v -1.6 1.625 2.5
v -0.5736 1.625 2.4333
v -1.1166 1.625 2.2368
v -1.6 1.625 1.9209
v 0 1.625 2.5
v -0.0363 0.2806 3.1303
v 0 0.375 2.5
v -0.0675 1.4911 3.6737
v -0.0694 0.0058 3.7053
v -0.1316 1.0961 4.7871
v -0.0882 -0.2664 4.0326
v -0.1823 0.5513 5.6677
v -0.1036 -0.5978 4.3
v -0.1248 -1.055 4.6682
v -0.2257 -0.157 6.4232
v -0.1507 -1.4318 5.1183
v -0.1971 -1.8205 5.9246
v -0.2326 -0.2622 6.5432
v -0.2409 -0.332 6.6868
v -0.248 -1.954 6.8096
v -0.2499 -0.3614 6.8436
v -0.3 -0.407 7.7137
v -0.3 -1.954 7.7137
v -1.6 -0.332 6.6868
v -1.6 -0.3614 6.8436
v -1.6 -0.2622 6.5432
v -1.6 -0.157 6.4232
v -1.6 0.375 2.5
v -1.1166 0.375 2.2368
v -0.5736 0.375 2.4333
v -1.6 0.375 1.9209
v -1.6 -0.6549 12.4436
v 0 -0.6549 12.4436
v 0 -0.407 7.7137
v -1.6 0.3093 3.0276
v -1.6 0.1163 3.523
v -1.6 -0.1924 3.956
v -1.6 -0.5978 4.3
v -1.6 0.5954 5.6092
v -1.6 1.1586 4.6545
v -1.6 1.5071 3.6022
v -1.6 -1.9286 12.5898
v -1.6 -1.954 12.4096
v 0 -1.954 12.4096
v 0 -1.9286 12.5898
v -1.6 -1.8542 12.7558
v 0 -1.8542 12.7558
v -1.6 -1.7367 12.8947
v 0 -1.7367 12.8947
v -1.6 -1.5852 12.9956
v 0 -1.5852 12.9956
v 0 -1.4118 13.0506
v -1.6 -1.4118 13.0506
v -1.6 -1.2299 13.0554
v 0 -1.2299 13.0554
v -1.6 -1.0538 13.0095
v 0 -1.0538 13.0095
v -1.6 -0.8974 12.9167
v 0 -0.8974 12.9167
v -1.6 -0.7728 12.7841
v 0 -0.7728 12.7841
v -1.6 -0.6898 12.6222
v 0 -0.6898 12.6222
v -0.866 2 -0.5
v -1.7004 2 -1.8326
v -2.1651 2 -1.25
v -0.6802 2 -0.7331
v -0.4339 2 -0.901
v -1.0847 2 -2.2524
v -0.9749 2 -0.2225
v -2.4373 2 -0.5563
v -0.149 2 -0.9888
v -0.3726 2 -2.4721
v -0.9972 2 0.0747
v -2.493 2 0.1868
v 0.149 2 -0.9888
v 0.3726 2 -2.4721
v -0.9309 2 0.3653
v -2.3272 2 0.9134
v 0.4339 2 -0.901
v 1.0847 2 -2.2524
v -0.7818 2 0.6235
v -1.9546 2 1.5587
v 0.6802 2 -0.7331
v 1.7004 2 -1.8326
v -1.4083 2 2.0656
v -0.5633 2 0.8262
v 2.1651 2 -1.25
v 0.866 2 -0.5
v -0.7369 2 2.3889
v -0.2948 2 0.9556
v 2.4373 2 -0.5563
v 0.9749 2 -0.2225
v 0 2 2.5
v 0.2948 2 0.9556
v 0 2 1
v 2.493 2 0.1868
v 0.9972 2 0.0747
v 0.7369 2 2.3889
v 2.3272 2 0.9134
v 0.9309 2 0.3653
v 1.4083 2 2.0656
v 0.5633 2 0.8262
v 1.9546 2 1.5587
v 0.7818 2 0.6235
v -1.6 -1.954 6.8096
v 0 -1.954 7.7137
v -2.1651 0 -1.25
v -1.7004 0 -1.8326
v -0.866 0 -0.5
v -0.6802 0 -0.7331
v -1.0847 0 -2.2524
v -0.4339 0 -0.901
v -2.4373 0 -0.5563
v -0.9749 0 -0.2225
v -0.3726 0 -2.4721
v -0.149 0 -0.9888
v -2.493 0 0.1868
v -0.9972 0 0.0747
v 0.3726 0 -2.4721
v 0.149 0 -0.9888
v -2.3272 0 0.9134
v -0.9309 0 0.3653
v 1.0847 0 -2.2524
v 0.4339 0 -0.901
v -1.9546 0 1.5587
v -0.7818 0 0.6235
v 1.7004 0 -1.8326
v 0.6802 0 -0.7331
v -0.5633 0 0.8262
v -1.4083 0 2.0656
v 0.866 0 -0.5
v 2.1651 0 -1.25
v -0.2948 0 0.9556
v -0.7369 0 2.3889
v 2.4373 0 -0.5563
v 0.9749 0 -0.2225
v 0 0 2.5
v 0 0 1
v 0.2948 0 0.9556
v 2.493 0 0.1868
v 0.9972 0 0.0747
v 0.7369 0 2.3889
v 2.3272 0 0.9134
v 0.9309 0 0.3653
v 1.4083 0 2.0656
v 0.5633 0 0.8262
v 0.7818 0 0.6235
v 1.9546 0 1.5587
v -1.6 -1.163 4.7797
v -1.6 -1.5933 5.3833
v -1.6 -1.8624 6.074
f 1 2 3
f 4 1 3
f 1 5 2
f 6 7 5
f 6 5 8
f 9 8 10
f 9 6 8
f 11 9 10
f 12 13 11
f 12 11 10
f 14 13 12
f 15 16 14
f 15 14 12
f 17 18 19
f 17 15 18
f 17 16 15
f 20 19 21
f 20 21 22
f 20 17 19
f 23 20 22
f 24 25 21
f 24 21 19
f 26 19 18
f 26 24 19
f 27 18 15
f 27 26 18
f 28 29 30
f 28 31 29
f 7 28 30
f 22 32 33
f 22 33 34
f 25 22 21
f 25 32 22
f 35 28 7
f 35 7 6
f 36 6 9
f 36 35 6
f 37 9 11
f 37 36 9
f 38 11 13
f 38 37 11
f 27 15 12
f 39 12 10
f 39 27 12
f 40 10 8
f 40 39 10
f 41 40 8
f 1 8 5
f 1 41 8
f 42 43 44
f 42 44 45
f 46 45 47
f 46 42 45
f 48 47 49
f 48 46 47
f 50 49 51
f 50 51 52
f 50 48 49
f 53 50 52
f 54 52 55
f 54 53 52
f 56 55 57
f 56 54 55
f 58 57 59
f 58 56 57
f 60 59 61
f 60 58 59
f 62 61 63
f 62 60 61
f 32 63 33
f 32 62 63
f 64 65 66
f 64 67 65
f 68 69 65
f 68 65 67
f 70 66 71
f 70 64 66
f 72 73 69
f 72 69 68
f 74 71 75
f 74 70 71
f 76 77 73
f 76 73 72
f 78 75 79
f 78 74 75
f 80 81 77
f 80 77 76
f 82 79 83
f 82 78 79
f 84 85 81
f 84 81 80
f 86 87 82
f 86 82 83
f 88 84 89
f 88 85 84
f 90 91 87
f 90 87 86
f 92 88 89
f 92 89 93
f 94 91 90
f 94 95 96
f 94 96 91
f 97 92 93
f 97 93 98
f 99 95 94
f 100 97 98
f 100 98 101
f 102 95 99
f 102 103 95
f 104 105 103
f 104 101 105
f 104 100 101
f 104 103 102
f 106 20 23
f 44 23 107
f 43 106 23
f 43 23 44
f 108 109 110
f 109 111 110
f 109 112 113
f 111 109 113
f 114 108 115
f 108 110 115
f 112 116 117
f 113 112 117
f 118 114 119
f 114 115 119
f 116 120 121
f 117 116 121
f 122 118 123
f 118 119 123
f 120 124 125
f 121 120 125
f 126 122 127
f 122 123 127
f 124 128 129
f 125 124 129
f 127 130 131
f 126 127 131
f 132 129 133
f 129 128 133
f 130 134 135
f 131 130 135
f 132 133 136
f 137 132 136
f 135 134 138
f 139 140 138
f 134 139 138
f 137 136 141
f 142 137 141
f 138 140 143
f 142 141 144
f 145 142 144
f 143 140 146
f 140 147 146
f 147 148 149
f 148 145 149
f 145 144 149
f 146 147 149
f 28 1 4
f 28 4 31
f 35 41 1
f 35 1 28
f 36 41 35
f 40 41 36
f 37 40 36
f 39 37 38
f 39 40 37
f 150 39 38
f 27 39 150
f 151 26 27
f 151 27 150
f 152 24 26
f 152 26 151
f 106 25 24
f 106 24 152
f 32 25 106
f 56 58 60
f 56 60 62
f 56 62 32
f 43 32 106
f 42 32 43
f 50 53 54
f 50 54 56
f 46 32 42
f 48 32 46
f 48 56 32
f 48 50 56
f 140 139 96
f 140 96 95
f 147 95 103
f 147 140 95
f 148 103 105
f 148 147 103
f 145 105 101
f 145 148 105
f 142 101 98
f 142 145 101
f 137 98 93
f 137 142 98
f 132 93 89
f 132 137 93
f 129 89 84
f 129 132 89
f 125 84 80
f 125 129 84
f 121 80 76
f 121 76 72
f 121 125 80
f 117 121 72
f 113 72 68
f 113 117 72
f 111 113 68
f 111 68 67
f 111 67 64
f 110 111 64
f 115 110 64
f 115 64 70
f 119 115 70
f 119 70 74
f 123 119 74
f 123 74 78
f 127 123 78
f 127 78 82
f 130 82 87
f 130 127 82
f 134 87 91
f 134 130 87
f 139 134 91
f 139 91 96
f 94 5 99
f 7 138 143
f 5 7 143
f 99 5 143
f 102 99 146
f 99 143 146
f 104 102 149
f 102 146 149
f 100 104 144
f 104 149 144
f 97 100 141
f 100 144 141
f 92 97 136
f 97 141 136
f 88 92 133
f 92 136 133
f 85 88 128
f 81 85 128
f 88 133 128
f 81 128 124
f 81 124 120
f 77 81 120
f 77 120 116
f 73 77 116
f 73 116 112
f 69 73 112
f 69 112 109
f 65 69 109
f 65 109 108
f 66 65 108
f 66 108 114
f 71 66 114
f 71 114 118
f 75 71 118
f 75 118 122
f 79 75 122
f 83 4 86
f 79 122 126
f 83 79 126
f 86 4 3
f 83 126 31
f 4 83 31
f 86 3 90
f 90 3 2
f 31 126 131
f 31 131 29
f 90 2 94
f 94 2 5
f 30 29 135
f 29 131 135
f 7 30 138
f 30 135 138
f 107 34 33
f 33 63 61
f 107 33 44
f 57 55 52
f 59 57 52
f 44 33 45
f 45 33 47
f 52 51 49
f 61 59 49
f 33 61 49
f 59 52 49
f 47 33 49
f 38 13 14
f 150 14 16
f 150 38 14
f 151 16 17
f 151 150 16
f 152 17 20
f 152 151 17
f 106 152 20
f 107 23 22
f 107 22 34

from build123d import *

# Parameters (mm, degrees)
SKETCH1_R           = 2.5
SKETCH1_R_2         = 1
BOSS_EXTRUDE1_DEPTH = 2
BOSS_EXTRUDE2_DEPTH = 0.8
CUT_EXTRUDE1_DEPTH  = 14.872182458


with BuildPart() as part:
    # Sketch1 → Boss-Extrude1 (new body)
    with BuildSketch(Plane(origin=(0, 0, 0), x_dir=(1, 0, 0), z_dir=(0, 1, 0))):
        with Locations(Location((0, 0, 0), (0, 0, 270))):
            Circle(SKETCH1_R)
        with Locations(Location((0, 0, 0), (0, 0, 270))):
            Circle(SKETCH1_R_2, mode=Mode.SUBTRACT)
    extrude(amount=BOSS_EXTRUDE1_DEPTH)

    # Sketch7 → Boss-Extrude2 (add, symmetric)
    with BuildSketch(Plane(origin=(-0.8, 0, 0), x_dir=(0, -1, 0), z_dir=(-1, 0, 0))):
        with BuildLine():
            Line((1.954019719, 6.809600844), (1.954019719, 12.409600844))
            ThreePointArc((1.954019719, 12.409600844), (1.321034736, 13.059378105), (0.654910522, 12.443619215))
            Line((0.654910522, 12.443619215), (0.361426958, 6.843619215))
            ThreePointArc((0.361426958, 6.843619215), (0.301852122, 6.612668496), (0.157008946, 6.423174828))
            ThreePointArc((0.157008946, 6.423174828), (-1.158621723, 4.654463774), (-1.625, 2.5))
            Line((-1.625, 2.5), (-1.625, 1.75))
            Line((-1.625, 1.75), (-0.375, 1.75))
            Line((-0.375, 1.75), (-0.375, 2.5))
            ThreePointArc((-0.375, 2.5), (-0.11625091, 3.523019396), (0.597766538, 4.3))
            ThreePointArc((0.597766538, 4.3), (1.593265867, 5.383283989), (1.954019719, 6.809600844))
        make_face()
    extrude(amount=BOSS_EXTRUDE2_DEPTH, both=True)

    # Sketch9 → Cut-Extrude1 (cut, through all)
    with BuildSketch(Plane.XZ.offset(1.954019719)):
        Polygon((0, 2.5), (-0.3, 7.71372429), (0, 7.71372429), align=None)
    extrude(amount=-CUT_EXTRUDE1_DEPTH, mode=Mode.SUBTRACT)


solid = part.part
